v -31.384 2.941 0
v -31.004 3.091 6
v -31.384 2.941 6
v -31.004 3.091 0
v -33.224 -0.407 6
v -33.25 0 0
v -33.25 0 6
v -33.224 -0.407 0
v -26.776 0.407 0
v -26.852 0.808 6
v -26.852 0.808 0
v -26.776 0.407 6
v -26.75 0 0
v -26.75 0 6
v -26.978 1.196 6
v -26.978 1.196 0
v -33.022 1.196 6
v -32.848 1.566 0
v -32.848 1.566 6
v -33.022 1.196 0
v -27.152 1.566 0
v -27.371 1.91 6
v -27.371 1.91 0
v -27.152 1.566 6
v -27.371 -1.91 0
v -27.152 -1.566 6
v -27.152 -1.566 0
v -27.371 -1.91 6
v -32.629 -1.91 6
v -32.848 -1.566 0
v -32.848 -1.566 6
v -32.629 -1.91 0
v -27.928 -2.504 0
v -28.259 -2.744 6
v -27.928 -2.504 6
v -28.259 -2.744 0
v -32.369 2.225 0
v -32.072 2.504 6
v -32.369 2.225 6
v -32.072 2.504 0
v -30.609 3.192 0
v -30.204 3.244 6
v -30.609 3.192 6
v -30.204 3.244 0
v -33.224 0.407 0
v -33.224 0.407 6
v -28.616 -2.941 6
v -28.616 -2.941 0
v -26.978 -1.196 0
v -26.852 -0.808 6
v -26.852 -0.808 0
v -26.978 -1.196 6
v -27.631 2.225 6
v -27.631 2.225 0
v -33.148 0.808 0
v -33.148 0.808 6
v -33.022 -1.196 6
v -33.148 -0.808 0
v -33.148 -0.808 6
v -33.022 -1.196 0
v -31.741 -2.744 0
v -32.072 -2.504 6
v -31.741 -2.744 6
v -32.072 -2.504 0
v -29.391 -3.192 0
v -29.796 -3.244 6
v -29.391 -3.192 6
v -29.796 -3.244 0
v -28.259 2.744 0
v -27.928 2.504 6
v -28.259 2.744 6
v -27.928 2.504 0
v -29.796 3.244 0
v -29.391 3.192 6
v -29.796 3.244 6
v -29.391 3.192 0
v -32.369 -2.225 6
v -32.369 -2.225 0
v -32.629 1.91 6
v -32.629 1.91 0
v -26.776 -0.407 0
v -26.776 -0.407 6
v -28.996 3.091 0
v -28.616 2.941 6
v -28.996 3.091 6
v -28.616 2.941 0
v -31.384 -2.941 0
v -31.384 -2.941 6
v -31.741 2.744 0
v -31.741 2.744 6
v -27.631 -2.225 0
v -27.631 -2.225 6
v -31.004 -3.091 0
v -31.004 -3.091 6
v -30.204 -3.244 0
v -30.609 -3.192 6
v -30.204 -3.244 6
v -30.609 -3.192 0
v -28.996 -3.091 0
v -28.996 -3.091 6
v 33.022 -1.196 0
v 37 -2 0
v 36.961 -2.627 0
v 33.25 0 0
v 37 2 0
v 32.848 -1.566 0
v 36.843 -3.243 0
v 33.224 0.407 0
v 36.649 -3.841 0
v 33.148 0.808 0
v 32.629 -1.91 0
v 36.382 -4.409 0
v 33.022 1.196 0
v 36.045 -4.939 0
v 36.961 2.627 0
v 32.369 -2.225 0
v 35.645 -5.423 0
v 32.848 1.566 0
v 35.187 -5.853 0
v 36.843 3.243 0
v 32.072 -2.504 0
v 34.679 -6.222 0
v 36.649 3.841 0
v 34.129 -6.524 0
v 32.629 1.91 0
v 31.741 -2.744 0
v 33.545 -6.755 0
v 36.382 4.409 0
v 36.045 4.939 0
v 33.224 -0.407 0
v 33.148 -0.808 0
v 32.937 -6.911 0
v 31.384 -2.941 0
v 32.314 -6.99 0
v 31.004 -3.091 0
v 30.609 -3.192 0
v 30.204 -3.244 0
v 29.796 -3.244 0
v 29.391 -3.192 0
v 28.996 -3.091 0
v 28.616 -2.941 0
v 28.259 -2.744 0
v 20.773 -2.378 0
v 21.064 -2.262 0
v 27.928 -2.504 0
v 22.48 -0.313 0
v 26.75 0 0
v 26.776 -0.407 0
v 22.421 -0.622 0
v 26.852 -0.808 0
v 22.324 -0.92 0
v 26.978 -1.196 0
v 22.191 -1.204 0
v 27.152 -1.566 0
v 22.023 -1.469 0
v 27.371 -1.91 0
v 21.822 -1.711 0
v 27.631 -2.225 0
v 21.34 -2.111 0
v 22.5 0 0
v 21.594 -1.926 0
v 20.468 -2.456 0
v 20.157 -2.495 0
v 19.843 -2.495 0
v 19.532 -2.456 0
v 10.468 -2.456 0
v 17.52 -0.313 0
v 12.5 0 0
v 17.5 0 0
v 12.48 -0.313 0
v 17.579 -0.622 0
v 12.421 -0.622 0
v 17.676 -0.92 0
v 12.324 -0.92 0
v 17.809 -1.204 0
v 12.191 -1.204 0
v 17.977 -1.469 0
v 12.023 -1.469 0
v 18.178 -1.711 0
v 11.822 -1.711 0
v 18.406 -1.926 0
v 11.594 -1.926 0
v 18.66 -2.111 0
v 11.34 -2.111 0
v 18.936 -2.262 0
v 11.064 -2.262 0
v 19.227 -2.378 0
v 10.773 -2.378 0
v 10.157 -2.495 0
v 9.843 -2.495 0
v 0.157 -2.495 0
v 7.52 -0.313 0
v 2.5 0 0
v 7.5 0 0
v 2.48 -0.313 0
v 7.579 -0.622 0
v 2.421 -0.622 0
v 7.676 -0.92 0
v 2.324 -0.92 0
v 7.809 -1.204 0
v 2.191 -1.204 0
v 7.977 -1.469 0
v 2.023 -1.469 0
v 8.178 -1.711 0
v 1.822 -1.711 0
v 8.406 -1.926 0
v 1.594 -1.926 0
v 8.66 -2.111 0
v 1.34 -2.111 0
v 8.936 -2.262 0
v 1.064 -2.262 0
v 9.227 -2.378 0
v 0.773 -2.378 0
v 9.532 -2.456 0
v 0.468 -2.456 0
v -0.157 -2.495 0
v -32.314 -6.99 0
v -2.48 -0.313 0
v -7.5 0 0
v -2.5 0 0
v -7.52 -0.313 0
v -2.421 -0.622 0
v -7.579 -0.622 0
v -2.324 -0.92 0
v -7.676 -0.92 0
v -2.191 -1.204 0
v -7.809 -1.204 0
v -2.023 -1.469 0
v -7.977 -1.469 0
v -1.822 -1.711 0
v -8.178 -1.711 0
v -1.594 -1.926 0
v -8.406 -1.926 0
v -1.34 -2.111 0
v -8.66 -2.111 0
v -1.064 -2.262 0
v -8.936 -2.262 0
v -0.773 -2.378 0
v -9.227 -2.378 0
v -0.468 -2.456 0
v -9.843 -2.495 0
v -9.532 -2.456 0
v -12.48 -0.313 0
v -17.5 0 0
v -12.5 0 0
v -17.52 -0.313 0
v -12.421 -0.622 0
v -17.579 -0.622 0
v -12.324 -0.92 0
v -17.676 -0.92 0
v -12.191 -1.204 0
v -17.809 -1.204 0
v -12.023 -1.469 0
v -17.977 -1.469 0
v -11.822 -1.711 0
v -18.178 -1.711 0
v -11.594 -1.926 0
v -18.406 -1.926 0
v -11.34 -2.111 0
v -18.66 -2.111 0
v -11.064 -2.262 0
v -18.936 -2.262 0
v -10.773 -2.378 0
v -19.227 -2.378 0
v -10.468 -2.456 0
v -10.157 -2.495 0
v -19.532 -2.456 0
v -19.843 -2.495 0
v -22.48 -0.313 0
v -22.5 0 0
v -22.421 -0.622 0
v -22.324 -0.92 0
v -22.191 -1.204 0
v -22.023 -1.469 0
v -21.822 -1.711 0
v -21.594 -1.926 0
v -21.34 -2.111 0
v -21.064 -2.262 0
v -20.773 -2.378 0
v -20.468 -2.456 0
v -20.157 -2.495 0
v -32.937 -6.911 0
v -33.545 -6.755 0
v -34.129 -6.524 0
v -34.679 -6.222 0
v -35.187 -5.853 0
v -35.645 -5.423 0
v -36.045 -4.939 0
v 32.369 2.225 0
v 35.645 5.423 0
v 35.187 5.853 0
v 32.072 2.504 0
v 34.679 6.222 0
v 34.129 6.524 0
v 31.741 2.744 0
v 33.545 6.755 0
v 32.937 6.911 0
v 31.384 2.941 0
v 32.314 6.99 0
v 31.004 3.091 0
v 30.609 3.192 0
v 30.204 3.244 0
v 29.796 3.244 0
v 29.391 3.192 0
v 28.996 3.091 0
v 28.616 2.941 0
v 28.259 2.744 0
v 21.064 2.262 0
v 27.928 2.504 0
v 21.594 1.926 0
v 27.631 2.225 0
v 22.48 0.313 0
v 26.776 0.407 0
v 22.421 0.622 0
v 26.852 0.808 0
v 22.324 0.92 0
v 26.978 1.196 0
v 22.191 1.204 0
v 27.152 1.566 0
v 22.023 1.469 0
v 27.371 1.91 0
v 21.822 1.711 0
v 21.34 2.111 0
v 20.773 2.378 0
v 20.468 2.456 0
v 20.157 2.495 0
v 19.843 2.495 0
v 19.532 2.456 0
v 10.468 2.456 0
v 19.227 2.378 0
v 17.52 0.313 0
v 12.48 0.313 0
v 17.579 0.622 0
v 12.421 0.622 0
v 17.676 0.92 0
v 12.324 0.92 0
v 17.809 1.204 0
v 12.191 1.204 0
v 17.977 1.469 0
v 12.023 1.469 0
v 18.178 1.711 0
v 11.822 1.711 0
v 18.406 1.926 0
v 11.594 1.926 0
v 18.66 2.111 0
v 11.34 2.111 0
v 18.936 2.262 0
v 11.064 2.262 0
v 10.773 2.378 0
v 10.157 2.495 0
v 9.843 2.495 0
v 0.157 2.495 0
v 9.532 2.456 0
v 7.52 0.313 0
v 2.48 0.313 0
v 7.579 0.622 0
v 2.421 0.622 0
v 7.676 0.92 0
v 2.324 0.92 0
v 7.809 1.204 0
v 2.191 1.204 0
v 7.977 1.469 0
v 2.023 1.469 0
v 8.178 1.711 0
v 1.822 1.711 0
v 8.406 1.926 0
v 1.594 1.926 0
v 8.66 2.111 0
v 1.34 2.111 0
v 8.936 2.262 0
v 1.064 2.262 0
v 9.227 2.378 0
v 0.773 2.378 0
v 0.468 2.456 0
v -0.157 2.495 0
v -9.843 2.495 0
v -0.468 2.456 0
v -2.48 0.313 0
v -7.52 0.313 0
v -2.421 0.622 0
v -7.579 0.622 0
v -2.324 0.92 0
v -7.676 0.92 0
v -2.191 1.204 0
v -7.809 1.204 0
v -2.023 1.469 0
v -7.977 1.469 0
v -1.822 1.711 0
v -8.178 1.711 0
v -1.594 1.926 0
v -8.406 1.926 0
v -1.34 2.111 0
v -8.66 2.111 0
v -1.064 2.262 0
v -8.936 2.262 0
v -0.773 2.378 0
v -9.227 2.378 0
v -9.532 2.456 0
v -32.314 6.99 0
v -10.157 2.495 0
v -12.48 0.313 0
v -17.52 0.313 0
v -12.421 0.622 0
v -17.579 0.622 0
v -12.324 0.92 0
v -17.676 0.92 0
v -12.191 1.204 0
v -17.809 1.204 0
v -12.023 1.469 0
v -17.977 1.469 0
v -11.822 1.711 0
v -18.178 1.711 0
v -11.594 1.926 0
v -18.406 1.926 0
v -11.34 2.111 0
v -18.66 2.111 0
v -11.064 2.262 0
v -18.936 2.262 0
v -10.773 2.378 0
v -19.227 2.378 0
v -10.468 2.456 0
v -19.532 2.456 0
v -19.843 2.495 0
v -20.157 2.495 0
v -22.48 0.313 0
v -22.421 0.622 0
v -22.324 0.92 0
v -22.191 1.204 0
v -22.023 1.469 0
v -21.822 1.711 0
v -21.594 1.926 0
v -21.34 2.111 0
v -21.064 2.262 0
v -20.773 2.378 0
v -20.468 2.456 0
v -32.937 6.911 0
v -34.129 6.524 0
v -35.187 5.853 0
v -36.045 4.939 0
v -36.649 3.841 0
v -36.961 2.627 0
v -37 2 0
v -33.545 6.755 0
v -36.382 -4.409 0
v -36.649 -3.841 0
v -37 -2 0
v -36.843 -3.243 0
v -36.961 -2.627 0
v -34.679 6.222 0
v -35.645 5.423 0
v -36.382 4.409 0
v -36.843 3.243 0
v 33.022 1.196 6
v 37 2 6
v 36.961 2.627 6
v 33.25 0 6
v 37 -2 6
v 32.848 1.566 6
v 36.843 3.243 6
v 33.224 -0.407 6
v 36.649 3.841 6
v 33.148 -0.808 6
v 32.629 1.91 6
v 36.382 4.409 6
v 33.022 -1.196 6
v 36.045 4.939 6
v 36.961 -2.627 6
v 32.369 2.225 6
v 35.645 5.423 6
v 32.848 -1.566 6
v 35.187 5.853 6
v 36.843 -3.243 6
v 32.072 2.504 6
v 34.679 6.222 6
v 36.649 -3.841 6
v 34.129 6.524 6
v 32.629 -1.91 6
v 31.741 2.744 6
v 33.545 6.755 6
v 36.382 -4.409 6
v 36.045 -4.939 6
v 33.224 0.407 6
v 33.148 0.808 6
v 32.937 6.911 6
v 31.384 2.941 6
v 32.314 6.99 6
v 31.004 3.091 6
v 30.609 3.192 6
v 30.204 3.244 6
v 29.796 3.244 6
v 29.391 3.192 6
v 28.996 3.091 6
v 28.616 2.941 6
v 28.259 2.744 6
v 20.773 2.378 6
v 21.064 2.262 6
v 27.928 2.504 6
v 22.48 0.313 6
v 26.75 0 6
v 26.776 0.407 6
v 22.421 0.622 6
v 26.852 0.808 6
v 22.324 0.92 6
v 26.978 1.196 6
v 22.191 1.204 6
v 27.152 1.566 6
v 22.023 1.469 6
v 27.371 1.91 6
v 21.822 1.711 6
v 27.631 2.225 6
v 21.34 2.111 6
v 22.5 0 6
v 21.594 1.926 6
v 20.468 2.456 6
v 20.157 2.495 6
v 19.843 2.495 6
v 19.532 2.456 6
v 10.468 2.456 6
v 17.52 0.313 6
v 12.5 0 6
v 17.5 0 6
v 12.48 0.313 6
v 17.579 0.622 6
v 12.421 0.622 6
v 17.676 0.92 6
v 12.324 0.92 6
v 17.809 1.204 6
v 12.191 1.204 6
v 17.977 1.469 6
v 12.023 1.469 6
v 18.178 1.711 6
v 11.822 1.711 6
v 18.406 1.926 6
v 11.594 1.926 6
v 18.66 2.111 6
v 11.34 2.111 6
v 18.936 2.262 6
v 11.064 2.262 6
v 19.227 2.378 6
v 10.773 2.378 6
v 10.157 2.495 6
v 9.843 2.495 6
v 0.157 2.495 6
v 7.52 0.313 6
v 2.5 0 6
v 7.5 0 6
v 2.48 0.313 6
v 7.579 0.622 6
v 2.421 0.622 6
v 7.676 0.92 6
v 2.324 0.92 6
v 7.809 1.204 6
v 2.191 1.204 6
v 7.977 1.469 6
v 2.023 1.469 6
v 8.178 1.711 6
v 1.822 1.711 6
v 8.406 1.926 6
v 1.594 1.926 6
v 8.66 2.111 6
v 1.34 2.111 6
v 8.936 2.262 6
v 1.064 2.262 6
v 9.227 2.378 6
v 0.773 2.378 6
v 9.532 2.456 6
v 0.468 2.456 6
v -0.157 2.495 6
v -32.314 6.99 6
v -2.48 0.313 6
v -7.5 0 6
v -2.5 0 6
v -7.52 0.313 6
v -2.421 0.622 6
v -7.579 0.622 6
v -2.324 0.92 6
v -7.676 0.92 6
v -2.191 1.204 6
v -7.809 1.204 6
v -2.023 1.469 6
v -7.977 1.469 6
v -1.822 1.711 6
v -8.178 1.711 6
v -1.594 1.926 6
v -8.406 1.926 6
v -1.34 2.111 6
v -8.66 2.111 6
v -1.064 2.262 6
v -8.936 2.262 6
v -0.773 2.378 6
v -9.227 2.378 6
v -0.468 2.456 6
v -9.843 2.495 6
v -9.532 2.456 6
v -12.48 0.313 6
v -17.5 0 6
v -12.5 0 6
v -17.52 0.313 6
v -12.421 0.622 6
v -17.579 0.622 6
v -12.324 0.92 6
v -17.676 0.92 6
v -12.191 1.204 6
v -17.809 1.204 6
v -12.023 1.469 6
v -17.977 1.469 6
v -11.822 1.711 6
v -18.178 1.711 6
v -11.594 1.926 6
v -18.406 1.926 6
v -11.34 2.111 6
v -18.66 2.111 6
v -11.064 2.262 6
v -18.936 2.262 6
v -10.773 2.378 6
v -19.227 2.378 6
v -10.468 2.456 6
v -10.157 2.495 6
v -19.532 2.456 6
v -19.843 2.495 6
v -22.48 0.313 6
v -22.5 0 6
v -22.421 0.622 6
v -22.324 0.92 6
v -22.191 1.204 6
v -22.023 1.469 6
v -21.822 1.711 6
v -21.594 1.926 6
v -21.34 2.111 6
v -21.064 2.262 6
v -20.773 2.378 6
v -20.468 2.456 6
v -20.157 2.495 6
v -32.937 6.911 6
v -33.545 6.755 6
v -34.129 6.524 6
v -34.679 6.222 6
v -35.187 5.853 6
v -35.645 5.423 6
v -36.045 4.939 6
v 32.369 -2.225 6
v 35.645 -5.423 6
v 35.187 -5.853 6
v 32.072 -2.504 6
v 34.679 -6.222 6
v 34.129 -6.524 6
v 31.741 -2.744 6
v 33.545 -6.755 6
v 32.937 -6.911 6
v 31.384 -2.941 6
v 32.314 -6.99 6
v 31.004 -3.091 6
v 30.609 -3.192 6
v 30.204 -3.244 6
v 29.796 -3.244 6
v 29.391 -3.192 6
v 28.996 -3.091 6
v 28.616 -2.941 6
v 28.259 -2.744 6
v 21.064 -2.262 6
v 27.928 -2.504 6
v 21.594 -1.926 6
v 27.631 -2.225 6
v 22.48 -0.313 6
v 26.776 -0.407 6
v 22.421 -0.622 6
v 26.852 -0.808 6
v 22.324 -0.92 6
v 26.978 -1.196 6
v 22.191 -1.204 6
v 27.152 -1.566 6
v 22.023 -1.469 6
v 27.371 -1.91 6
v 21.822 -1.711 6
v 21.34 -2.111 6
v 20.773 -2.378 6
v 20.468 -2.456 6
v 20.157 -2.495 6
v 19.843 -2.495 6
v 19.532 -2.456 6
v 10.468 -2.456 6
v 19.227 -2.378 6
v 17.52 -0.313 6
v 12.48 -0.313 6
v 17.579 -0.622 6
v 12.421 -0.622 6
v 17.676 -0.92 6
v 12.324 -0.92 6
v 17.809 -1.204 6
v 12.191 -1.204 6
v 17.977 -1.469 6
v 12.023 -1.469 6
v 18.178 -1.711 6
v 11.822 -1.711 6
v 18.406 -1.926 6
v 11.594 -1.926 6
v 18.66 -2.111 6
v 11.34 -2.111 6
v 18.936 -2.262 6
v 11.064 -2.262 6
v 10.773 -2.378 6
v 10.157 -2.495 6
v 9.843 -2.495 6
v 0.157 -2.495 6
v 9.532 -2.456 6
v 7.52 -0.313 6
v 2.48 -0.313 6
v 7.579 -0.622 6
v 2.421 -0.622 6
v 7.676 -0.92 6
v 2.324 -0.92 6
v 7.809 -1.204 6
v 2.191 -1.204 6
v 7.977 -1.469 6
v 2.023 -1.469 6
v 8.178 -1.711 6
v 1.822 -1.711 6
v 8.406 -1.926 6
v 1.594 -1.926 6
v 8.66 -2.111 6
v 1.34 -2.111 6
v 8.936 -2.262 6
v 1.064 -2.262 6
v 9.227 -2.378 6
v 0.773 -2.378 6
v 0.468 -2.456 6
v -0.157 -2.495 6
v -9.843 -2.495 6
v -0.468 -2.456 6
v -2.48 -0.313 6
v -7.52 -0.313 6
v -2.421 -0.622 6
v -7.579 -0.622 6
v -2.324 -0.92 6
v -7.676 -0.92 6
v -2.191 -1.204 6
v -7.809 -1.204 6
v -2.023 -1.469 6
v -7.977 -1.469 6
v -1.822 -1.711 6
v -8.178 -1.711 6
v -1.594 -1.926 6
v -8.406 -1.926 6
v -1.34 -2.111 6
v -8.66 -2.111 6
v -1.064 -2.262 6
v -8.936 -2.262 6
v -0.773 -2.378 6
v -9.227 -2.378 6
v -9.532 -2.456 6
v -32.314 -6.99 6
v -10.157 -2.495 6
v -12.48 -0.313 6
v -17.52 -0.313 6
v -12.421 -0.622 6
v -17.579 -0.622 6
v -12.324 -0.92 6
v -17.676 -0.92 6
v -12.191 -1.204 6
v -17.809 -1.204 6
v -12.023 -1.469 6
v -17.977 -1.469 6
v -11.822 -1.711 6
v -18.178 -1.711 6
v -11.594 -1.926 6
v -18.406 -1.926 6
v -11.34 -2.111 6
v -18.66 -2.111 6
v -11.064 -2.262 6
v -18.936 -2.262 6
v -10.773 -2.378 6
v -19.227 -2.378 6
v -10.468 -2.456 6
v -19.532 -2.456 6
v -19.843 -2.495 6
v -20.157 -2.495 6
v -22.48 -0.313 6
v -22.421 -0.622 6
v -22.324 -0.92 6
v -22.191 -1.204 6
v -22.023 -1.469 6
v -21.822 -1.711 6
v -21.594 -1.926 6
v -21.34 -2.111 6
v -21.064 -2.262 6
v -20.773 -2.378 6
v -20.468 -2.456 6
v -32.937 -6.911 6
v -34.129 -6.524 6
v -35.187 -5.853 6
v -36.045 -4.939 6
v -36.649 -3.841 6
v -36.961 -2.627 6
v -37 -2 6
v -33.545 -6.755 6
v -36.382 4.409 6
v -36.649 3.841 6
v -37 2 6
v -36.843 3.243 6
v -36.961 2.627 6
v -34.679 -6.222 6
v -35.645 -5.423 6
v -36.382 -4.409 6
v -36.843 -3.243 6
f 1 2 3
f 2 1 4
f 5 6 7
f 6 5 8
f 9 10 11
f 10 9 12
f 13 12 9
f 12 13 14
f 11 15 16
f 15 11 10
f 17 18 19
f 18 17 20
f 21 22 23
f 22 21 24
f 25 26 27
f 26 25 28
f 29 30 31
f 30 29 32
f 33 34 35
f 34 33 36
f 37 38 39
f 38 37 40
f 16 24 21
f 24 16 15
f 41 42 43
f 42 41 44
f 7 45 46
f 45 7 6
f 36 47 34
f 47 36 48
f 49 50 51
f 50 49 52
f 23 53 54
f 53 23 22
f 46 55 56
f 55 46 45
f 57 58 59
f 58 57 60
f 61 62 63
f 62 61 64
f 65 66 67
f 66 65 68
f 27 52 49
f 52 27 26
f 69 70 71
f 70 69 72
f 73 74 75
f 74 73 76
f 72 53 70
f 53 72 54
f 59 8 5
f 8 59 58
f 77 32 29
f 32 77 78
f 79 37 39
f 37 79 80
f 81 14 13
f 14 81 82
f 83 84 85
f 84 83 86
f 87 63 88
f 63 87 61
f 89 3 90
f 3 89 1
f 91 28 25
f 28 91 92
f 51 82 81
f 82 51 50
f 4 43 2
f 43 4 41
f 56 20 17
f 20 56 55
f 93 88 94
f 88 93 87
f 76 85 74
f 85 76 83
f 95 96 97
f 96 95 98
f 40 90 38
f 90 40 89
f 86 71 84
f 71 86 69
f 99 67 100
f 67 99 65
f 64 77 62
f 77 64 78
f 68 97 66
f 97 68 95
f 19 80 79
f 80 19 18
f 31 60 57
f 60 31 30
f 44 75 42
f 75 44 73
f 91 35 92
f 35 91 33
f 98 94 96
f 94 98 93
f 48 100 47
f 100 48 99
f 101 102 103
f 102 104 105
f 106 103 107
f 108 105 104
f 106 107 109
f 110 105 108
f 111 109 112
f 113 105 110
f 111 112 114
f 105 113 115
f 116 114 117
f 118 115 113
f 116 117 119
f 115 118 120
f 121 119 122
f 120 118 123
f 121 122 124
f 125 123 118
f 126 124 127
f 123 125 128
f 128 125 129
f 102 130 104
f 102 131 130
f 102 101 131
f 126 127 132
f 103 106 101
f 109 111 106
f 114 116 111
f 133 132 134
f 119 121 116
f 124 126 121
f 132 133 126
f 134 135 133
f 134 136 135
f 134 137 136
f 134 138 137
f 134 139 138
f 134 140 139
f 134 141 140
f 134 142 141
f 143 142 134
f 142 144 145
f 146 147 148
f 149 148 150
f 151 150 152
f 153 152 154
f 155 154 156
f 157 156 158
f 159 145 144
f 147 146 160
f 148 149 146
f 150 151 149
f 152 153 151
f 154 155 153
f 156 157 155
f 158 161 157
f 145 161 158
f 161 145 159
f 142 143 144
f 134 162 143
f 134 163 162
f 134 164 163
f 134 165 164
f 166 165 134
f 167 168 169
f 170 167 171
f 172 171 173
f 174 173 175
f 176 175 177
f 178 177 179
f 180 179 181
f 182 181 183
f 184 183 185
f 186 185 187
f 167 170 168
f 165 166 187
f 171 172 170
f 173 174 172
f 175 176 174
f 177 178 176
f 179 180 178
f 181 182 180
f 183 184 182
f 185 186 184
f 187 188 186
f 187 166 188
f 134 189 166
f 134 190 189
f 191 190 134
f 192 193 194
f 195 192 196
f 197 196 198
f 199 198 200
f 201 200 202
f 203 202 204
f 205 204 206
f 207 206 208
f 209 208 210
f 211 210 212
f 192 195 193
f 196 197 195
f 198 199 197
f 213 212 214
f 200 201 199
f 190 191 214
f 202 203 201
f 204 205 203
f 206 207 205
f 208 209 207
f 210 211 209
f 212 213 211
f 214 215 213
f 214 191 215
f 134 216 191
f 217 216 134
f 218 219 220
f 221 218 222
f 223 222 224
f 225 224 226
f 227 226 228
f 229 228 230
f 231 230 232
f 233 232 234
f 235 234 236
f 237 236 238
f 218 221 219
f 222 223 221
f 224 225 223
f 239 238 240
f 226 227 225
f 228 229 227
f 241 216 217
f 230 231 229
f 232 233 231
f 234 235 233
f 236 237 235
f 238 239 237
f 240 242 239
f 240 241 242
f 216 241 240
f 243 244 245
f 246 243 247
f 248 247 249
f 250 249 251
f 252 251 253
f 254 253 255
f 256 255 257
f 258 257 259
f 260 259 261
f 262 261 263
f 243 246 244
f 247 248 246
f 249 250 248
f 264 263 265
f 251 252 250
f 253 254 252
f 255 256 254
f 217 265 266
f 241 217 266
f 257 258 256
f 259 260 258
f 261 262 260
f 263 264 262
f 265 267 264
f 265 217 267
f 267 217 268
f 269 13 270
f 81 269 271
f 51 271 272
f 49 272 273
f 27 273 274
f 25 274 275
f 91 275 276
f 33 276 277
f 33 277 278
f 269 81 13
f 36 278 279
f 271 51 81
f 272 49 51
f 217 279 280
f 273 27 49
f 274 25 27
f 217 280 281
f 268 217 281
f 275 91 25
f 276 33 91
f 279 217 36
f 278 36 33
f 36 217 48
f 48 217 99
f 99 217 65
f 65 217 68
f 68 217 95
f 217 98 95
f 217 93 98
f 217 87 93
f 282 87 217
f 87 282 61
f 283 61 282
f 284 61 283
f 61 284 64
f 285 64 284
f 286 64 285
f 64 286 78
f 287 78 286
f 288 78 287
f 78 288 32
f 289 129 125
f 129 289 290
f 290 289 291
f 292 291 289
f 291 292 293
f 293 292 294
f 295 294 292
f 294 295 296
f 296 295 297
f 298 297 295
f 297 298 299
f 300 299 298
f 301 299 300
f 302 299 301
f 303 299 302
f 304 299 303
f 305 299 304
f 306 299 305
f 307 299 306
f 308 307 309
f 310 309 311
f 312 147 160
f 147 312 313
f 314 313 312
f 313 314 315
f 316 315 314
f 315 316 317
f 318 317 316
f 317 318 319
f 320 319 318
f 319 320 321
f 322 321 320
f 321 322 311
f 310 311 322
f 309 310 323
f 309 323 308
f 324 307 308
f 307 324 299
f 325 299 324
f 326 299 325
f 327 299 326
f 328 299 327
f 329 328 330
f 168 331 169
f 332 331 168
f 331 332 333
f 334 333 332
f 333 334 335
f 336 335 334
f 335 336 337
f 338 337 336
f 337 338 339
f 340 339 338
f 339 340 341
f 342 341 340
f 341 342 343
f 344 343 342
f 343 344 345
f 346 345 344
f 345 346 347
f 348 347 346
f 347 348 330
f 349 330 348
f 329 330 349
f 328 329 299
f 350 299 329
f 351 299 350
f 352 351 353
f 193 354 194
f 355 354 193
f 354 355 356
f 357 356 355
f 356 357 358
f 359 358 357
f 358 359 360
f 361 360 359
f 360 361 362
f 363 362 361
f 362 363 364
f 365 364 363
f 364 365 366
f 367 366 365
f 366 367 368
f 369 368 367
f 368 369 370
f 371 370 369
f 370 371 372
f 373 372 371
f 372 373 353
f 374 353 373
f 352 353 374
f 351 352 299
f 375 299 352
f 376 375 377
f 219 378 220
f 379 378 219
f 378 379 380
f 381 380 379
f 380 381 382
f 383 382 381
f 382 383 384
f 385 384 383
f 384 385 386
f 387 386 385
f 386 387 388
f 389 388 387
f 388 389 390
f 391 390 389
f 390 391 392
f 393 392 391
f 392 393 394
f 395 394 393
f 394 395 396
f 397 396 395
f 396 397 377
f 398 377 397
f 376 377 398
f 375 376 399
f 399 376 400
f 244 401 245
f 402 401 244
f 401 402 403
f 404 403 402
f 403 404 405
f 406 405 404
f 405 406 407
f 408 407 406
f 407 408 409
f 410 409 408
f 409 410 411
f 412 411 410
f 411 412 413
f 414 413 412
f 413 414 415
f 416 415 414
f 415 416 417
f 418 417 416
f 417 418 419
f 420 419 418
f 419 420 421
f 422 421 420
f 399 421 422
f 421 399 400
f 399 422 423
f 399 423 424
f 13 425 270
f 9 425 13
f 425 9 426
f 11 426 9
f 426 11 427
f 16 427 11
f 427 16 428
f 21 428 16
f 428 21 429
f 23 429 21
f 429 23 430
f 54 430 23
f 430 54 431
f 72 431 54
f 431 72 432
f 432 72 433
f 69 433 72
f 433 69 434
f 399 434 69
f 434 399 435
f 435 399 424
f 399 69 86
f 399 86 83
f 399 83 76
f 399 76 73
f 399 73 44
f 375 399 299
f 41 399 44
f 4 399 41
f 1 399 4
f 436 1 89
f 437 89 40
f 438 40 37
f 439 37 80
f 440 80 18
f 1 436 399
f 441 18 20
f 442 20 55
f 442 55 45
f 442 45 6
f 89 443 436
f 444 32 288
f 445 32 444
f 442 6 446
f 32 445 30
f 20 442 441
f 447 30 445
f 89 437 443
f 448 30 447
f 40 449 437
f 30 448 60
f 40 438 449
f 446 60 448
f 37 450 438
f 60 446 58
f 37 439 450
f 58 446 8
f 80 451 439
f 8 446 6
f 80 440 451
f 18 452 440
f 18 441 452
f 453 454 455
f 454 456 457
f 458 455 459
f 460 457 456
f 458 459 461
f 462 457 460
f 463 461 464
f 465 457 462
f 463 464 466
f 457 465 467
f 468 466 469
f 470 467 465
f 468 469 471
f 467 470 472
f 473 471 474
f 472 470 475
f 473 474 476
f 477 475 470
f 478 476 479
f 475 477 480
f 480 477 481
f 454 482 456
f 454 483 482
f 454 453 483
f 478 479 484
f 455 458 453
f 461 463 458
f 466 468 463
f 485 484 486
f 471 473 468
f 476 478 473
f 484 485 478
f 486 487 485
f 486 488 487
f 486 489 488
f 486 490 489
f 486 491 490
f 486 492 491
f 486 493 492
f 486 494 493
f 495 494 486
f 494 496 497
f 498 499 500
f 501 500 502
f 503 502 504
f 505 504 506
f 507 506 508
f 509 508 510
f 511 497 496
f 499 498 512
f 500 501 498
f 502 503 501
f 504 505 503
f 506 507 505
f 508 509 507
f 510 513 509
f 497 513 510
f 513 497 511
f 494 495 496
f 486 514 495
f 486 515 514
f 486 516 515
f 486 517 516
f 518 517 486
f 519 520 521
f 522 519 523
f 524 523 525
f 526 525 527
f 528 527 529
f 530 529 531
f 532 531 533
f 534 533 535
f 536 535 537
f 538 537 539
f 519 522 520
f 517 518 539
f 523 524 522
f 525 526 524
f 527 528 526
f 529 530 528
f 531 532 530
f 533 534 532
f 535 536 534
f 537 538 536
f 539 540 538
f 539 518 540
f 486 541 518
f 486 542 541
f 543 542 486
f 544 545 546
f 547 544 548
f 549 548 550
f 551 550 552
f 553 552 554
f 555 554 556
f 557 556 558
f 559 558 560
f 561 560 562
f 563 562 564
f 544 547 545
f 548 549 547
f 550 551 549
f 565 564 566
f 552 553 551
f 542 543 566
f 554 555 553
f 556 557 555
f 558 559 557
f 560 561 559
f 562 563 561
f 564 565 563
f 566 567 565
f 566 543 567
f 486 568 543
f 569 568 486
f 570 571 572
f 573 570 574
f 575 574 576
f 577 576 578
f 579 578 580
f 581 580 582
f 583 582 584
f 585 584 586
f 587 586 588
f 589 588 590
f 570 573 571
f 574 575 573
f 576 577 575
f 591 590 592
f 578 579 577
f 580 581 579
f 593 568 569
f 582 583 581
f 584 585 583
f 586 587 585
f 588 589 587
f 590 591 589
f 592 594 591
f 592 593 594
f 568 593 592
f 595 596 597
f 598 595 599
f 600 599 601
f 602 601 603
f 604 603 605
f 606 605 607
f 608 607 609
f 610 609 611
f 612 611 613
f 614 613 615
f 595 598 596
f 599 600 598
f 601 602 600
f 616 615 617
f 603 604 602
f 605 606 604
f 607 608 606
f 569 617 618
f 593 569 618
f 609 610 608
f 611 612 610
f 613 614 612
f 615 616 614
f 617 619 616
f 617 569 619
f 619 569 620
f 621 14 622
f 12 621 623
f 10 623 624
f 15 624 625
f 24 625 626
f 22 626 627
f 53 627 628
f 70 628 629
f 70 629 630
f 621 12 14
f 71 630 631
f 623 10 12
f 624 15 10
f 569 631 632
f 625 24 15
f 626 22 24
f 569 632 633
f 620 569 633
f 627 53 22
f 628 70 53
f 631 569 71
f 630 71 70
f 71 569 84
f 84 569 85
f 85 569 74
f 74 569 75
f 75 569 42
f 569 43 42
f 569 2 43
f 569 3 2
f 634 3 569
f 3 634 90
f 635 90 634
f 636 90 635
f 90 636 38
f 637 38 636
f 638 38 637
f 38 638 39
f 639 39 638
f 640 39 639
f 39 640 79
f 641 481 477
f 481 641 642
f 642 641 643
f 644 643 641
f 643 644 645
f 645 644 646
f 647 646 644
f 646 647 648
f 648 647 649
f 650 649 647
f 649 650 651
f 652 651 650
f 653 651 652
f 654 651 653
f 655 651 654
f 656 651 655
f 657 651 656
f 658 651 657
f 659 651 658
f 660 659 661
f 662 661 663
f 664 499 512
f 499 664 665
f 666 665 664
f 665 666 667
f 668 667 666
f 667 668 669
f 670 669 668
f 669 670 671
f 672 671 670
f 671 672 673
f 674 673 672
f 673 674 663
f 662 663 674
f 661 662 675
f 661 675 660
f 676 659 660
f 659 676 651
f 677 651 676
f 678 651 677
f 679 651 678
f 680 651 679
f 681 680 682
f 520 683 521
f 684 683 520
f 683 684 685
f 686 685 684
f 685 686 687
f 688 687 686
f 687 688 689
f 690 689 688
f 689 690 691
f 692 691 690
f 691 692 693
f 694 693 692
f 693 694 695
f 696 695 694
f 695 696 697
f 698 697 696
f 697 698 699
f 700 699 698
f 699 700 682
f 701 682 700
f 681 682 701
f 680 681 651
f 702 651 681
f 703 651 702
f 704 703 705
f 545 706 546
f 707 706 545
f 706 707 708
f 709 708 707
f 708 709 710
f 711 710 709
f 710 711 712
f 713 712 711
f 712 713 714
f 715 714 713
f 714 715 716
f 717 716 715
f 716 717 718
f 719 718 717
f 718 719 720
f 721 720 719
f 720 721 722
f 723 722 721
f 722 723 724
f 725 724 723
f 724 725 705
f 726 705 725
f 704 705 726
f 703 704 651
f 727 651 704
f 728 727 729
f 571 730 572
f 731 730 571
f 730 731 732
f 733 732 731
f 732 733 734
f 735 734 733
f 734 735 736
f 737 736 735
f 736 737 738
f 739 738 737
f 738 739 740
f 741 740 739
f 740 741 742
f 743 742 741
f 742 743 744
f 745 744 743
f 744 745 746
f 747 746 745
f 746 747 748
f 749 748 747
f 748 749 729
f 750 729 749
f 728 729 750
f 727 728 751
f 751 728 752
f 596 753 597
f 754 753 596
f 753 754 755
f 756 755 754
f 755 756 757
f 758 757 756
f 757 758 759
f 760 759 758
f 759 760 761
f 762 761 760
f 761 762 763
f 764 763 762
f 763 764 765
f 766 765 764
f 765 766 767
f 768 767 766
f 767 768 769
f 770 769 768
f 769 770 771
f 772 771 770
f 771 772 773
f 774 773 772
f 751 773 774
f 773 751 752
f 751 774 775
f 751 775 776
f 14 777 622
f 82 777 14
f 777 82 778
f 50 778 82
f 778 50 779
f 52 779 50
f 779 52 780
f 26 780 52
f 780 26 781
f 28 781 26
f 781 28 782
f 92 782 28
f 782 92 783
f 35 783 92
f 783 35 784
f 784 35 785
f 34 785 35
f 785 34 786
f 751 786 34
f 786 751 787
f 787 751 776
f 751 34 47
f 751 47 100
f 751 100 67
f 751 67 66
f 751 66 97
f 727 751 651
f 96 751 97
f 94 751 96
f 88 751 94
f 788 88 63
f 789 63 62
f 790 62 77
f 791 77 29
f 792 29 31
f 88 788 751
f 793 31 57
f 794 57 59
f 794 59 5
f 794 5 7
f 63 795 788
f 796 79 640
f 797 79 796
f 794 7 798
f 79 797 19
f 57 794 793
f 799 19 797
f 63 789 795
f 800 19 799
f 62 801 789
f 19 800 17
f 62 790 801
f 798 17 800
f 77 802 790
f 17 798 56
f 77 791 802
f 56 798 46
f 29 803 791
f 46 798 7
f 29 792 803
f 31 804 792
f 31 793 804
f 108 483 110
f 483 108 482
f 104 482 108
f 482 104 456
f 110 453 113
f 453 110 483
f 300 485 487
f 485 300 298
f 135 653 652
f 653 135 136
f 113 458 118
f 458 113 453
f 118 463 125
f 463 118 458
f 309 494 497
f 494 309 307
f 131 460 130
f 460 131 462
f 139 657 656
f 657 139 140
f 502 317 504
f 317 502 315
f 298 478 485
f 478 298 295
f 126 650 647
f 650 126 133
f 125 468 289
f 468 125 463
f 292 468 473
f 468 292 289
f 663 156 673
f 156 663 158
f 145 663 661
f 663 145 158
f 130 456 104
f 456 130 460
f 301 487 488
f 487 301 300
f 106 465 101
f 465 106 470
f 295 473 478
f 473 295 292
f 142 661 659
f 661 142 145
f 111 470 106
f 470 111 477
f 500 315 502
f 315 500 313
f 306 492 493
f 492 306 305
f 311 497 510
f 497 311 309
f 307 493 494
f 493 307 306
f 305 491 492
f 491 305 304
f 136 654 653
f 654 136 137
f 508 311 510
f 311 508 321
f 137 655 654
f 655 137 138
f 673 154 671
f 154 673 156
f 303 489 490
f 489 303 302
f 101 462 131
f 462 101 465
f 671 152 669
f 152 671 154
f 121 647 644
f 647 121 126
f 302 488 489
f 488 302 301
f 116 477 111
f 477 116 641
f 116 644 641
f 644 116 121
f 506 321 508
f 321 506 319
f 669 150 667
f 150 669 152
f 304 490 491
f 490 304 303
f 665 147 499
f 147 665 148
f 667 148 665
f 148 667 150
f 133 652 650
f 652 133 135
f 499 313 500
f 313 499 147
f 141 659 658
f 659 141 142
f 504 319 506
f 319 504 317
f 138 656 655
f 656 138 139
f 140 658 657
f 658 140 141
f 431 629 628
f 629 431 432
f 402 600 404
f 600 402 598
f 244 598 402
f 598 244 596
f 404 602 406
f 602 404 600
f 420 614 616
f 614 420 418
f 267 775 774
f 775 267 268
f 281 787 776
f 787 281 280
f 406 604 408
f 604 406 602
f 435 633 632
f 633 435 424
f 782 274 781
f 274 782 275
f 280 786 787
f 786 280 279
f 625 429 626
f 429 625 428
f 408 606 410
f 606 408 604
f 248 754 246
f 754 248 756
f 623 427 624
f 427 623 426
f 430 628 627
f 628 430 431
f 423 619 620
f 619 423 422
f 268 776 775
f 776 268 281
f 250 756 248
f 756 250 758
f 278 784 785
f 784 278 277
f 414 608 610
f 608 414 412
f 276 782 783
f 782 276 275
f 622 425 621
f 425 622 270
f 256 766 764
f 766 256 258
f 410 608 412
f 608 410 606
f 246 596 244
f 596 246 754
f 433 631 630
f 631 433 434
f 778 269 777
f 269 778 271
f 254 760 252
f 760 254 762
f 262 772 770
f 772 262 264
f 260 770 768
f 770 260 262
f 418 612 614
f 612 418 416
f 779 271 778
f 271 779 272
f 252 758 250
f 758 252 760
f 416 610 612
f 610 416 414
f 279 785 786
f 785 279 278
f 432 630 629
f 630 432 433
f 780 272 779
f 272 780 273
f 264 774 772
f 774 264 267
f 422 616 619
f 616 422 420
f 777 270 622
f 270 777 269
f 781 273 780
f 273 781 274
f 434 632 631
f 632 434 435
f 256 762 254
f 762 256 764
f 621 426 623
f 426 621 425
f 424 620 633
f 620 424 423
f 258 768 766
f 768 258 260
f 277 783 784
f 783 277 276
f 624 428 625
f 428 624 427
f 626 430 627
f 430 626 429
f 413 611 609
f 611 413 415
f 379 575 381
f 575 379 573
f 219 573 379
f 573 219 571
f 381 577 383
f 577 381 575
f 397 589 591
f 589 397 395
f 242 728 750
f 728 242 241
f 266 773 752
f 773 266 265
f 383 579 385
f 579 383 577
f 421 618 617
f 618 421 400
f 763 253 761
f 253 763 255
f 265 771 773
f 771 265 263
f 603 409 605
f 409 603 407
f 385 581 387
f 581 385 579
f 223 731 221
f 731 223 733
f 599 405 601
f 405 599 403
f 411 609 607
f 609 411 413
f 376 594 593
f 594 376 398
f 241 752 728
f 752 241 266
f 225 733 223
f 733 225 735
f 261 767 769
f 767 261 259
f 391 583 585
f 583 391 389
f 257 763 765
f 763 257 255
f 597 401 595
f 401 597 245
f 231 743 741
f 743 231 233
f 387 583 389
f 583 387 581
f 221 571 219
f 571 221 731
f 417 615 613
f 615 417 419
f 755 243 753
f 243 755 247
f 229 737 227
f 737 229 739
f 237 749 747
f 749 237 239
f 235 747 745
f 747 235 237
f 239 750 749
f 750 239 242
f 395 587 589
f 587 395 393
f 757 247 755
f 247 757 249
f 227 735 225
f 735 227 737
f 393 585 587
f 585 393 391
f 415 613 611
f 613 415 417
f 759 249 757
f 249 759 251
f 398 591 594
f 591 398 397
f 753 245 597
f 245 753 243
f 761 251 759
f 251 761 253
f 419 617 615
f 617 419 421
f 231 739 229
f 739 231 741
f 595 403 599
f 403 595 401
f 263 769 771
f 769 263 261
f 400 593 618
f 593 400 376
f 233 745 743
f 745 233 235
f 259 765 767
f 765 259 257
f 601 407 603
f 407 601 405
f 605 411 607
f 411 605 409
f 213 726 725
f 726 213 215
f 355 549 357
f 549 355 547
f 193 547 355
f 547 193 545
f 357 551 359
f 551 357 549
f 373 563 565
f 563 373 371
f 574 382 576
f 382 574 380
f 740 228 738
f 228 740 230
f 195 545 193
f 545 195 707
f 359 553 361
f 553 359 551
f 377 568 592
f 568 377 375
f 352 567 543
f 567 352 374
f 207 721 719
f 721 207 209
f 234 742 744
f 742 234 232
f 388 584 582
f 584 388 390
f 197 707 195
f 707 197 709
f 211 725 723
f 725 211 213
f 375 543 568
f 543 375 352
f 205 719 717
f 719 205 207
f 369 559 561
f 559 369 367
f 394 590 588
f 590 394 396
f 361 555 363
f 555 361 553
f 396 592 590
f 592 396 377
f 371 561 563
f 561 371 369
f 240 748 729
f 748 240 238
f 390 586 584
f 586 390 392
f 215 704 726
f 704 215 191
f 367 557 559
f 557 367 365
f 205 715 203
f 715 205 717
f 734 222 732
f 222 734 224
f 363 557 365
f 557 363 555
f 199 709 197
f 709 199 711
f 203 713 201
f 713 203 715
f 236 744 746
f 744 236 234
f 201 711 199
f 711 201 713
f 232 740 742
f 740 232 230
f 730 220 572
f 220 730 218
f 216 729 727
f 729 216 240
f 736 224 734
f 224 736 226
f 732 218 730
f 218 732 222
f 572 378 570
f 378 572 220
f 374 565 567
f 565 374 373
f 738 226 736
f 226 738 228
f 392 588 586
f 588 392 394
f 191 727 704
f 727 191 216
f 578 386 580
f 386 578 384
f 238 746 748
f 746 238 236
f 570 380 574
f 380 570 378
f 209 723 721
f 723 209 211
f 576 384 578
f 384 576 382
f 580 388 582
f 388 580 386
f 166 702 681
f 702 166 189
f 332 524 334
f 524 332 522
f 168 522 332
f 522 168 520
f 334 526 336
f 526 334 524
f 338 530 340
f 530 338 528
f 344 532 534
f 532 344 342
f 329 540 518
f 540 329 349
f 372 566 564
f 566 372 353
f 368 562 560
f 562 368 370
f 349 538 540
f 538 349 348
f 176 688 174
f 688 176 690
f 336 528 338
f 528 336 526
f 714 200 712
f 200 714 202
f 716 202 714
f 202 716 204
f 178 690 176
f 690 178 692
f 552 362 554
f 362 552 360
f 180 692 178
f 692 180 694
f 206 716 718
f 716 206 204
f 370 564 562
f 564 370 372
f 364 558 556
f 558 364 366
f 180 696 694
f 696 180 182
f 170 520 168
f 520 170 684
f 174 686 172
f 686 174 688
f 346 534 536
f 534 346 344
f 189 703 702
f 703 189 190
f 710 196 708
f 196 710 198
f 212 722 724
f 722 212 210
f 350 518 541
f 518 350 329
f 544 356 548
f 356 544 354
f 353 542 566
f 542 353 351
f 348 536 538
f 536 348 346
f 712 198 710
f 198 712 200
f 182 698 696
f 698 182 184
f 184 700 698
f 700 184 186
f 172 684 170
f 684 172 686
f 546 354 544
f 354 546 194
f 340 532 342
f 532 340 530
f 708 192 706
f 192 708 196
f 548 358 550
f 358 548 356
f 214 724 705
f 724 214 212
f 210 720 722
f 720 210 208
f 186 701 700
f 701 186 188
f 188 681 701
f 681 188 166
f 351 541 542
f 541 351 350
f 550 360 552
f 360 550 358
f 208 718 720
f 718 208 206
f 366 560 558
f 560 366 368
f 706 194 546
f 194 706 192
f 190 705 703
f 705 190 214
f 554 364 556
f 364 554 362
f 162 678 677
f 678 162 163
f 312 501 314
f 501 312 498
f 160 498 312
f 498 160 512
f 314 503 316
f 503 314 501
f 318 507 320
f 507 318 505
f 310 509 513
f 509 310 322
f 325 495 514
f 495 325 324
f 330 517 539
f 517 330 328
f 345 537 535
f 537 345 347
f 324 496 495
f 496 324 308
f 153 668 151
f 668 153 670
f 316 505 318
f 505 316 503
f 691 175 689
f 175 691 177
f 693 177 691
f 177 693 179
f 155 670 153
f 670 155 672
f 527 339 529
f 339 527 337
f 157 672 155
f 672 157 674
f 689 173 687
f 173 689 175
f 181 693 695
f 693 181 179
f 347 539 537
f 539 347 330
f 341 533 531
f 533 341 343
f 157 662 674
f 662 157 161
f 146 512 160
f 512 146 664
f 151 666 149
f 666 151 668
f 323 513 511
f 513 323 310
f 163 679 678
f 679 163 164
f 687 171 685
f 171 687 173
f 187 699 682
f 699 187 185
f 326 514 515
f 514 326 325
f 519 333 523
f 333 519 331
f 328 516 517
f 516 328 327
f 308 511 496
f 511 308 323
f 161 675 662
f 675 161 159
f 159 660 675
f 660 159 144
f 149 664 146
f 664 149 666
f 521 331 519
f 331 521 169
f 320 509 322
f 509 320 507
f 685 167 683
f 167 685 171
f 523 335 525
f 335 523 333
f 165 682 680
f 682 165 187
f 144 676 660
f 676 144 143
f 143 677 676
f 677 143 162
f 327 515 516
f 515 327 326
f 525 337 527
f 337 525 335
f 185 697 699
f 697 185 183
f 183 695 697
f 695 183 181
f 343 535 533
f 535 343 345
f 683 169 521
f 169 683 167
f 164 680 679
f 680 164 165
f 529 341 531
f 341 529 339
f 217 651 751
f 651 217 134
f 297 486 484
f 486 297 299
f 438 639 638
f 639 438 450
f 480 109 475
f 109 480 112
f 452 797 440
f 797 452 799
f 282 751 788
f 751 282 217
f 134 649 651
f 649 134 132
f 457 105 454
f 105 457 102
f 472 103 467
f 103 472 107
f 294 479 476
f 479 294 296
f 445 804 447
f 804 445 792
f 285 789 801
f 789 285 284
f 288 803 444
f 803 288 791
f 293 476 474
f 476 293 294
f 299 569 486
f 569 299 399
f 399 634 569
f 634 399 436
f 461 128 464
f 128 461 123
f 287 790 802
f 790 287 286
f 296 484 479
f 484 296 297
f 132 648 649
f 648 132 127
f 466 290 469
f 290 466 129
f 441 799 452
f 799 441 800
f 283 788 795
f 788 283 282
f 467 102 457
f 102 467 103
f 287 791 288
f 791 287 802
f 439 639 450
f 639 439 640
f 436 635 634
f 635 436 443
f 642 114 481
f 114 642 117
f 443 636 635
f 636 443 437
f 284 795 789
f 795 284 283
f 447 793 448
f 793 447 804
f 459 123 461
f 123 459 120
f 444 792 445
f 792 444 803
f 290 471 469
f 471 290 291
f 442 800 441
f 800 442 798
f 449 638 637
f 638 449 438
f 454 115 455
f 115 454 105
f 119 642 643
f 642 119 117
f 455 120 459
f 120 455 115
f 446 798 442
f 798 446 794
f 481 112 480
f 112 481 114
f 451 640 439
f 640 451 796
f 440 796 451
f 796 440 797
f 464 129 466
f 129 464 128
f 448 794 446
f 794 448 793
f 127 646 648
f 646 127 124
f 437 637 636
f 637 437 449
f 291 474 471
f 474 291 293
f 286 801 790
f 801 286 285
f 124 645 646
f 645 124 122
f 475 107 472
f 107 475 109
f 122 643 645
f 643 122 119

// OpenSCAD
$fn = 50;

difference() {
	union() {
		hull() {
			translate(v = [-32.0, 2.0, 0]) {
				cylinder(h = 6, r = 5);
			}
			translate(v = [32.0, 2.0, 0]) {
				cylinder(h = 6, r = 5);
			}
			translate(v = [-32.0, -2.0, 0]) {
				cylinder(h = 6, r = 5);
			}
			translate(v = [32.0, -2.0, 0]) {
				cylinder(h = 6, r = 5);
			}
		}
	}
	union() {
		translate(v = [-30.0, 0.0, 0]) {
			cylinder(h = 6, r = 3.25);
		}
		translate(v = [30.0, 0.0, 0]) {
			cylinder(h = 6, r = 3.25);
		}
		translate(v = [-20.0, 0, 0.0]) {
			cylinder(h = 6, r = 2.5);
		}
		translate(v = [-10.0, 0, 0.0]) {
			cylinder(h = 6, r = 2.5);
		}
		cylinder(h = 6, r = 2.5);
		translate(v = [10.0, 0, 0.0]) {
			cylinder(h = 6, r = 2.5);
		}
		translate(v = [20.0, 0, 0.0]) {
			cylinder(h = 6, r = 2.5);
		}
	}
}
